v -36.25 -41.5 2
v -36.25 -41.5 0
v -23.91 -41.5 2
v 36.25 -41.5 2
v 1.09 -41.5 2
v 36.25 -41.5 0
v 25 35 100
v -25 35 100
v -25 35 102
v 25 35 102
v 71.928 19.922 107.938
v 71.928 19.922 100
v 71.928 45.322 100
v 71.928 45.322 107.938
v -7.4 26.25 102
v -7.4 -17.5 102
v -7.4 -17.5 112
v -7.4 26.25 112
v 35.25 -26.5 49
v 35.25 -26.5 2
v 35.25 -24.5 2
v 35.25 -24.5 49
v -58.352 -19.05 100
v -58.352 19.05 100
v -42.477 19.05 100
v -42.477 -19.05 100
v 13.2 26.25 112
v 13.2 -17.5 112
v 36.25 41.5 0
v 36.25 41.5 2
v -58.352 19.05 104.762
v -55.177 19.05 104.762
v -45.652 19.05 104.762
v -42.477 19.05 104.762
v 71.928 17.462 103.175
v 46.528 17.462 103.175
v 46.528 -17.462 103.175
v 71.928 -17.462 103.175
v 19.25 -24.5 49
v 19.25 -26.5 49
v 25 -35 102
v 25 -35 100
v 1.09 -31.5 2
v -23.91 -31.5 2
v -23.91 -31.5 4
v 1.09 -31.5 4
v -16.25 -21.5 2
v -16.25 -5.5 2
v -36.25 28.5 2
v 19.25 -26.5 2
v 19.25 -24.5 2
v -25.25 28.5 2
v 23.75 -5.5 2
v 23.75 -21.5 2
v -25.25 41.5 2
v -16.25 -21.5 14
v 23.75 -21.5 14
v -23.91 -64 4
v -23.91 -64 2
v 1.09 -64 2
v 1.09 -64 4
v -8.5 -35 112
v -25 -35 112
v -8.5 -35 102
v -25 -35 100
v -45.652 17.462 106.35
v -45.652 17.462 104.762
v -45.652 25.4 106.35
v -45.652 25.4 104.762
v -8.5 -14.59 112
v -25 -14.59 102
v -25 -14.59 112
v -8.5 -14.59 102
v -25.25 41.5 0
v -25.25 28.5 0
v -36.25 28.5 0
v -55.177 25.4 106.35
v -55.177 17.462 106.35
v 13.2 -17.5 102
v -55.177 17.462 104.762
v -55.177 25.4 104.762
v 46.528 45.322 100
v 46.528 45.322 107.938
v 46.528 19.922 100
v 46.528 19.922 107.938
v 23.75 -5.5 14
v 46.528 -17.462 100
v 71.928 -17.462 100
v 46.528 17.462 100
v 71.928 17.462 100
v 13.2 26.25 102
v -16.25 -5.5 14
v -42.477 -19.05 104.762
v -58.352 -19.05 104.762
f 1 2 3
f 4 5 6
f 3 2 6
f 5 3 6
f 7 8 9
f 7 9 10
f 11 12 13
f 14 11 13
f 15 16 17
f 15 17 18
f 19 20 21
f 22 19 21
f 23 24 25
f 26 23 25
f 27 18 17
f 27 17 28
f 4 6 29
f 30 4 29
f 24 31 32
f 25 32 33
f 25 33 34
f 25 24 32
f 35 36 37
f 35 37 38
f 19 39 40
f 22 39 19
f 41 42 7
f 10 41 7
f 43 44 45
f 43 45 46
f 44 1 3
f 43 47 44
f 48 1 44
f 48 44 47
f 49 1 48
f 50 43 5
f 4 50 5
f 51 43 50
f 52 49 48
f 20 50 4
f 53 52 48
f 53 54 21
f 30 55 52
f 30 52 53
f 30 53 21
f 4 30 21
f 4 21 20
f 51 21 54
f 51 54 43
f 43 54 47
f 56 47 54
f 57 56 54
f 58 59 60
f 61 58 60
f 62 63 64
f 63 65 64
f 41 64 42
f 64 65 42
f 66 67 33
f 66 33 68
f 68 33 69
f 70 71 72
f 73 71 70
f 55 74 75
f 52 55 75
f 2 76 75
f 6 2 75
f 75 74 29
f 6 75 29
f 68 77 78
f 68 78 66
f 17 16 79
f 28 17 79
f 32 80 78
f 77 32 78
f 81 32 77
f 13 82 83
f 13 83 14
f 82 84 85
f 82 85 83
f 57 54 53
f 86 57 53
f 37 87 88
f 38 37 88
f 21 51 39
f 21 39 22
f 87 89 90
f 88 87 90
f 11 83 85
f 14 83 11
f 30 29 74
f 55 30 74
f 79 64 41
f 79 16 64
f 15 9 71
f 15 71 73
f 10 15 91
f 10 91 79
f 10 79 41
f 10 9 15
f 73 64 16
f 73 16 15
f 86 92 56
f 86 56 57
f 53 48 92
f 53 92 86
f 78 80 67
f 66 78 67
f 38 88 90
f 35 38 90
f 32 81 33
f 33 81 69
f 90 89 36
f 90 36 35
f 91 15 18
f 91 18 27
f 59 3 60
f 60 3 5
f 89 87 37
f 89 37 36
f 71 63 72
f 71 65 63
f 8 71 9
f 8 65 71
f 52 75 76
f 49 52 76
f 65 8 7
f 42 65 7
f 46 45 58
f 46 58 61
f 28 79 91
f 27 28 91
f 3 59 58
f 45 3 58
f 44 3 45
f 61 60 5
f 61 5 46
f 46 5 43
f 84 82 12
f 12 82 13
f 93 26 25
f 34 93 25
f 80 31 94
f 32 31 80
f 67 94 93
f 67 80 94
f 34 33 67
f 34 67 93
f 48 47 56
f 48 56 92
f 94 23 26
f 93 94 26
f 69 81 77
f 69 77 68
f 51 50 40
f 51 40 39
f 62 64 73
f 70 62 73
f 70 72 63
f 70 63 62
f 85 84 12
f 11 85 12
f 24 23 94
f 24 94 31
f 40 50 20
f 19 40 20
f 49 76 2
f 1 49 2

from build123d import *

# Parameters (mm, degrees)
F1_DEPTH  = 2
F2_W      = 25
F2_H      = 32.5
F3_DEPTH  = 2
F4_W      = 16
F4_H      = 2
F5_DEPTH  = 47
F6_W      = 40
F6_H      = 16
F7_DEPTH  = 12
F9_W      = 50
F9_H      = 70
F10_DEPTH = 2
F11_W     = 15.875
F11_H     = 38.1
F12_DEPTH = 4.7625
F13_W     = 9.525
F13_H     = 7.9375
F14_DEPTH = 1.5875
F15_W     = 25.4
F15_H     = 34.925
F16_DEPTH = 3.175
F17_W     = 25.4
F17_H     = 25.4
F18_DEPTH = 7.9375
F19_W     = 20.6
F19_H     = 43.75
F19_W_2   = 16.5
F19_H_2   = 20.41
F20_DEPTH = 10


# Not quite as in the source:
# - a length typed as a fraction of an inch, garbled in the dataset ("3 / 203.2 mm" for 3/8 in), is restored


with BuildPart() as f1:
    # F0 (on Top) → F1 (new body)
    with BuildSketch(Plane.XY):
        Polygon((36.25, -41.5), (36.25, 41.5), (-25.25, 41.5), (-25.25, 28.5), (-36.25, 28.5), (-36.25, -41.5), align=None)
    extrude(amount=F1_DEPTH)

    # F2 (on face) → F3 (join)
    with BuildSketch(Plane.XY.offset(2)):
        with Locations((-11.410252214, -47.75)):
            Rectangle(F2_W, F2_H)
    extrude(amount=F3_DEPTH)

    # F4 (on face) → F5 (join)
    with BuildSketch(Plane.XY.offset(2)):
        with Locations((27.25, -25.5)):
            Rectangle(F4_W, F4_H)
    extrude(amount=F5_DEPTH)

    # F6 (on face) → F7 (join)
    with BuildSketch(Plane.XY.offset(2)):
        with Locations((3.75, -13.5)):
            Rectangle(F6_W, F6_H)
    extrude(amount=F7_DEPTH)


with BuildPart() as f10:
    # F9 (on offset) → F10 (new body)
    with BuildSketch(Plane.XY.offset(100)):
        Rectangle(F9_W, F9_H)
    extrude(amount=F10_DEPTH)

    # F19 (on face) → F20 (join)
    with BuildSketch(Plane.XY.offset(102)):
        with Locations((2.9, 4.375)):
            Rectangle(F19_W, F19_H)
        with Locations((-16.75, -24.795)):
            Rectangle(F19_W_2, F19_H_2)
    extrude(amount=F20_DEPTH)


with BuildPart() as f12:
    # F11 (on offset) → F12 (new body)
    with BuildSketch(Plane.XY.offset(100)):
        with Locations((-50.4140848588, 0)):
            Rectangle(F11_W, F11_H)
    extrude(amount=F12_DEPTH)

    # F13 (on face) → F14 (join)
    with BuildSketch(Plane.XY.offset(104.7625)):
        with Locations((-50.4140848588, 21.43125)):
            Rectangle(F13_W, F13_H)
    extrude(amount=F14_DEPTH)


with BuildPart() as f16:
    # F15 (on offset) → F16 (new body)
    with BuildSketch(Plane.XY.offset(100)):
        with Locations((59.2281589311, 0)):
            Rectangle(F15_W, F15_H)
    extrude(amount=F16_DEPTH)


with BuildPart() as f18:
    # F17 (on offset) → F18 (new body)
    with BuildSketch(Plane.XY.offset(100)):
        with Locations((59.2281589311, 32.621730119)):
            Rectangle(F17_W, F17_H)
    extrude(amount=F18_DEPTH)


solid = Compound([f1.part, f10.part, f12.part, f16.part, f18.part])
